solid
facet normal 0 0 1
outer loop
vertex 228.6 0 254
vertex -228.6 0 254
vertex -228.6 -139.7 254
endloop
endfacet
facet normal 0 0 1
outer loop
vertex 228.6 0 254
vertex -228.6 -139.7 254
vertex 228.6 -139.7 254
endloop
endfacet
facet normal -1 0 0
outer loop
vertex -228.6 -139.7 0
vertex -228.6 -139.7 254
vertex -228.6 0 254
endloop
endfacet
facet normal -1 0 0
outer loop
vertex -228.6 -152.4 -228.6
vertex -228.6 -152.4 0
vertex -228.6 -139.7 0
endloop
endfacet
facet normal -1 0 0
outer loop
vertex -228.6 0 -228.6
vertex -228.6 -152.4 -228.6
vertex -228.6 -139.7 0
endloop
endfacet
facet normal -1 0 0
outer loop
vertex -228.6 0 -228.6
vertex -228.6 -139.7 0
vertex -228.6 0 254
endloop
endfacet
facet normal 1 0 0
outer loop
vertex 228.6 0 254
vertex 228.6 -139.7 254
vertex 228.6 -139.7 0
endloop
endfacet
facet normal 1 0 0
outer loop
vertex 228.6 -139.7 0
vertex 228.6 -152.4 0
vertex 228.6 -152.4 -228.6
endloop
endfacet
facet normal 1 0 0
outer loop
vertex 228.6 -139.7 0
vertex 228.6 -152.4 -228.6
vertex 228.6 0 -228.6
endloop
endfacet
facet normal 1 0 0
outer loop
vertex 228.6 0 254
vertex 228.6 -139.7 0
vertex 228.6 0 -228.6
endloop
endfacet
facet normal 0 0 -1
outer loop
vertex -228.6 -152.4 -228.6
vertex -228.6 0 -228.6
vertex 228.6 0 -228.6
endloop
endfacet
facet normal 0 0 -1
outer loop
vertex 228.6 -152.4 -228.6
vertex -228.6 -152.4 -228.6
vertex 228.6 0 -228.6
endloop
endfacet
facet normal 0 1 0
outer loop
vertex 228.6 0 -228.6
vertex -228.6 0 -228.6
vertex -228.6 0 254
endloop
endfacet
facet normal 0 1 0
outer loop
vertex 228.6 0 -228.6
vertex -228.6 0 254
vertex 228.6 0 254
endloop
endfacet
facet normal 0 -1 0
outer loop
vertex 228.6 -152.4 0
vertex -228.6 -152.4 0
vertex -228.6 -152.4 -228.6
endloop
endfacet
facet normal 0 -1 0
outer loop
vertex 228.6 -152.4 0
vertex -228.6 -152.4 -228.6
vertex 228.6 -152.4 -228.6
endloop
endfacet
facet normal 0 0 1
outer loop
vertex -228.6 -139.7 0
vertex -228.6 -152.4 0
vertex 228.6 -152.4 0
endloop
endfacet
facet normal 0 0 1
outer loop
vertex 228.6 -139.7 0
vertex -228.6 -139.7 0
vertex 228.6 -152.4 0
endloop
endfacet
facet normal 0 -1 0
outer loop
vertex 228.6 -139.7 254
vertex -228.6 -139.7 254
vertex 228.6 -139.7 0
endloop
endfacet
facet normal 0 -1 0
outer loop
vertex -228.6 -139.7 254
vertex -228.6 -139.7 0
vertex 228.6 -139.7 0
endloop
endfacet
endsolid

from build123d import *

# Parameters (mm, degrees)
F0_W     = 457.2
F0_H     = 457.2
F1_DEPTH = 152.4
F2_W     = 457.2
F2_H     = 228.6
F3_DEPTH = 12.7
F4_W     = 457.2
F4_H     = 139.7
F5_DEPTH = 25.4


with BuildPart() as f1:
    # F0 (on Front) → F1 (new body)
    with BuildSketch(Plane.XZ):
        Rectangle(F0_W, F0_H)
    extrude(amount=F1_DEPTH)

    # F2 (on face) → F3 (cut)
    with BuildSketch(Plane.XZ.offset(152.4)):
        with Locations((0, 114.3)):
            Rectangle(F2_W, F2_H)
    extrude(amount=-F3_DEPTH, mode=Mode.SUBTRACT)

    # F4 (on face) → F5 (join)
    with BuildSketch(Plane.XY.offset(228.6)):
        with Locations((0, -69.85)):
            Rectangle(F4_W, F4_H)
    extrude(amount=F5_DEPTH)


solid = f1.part
